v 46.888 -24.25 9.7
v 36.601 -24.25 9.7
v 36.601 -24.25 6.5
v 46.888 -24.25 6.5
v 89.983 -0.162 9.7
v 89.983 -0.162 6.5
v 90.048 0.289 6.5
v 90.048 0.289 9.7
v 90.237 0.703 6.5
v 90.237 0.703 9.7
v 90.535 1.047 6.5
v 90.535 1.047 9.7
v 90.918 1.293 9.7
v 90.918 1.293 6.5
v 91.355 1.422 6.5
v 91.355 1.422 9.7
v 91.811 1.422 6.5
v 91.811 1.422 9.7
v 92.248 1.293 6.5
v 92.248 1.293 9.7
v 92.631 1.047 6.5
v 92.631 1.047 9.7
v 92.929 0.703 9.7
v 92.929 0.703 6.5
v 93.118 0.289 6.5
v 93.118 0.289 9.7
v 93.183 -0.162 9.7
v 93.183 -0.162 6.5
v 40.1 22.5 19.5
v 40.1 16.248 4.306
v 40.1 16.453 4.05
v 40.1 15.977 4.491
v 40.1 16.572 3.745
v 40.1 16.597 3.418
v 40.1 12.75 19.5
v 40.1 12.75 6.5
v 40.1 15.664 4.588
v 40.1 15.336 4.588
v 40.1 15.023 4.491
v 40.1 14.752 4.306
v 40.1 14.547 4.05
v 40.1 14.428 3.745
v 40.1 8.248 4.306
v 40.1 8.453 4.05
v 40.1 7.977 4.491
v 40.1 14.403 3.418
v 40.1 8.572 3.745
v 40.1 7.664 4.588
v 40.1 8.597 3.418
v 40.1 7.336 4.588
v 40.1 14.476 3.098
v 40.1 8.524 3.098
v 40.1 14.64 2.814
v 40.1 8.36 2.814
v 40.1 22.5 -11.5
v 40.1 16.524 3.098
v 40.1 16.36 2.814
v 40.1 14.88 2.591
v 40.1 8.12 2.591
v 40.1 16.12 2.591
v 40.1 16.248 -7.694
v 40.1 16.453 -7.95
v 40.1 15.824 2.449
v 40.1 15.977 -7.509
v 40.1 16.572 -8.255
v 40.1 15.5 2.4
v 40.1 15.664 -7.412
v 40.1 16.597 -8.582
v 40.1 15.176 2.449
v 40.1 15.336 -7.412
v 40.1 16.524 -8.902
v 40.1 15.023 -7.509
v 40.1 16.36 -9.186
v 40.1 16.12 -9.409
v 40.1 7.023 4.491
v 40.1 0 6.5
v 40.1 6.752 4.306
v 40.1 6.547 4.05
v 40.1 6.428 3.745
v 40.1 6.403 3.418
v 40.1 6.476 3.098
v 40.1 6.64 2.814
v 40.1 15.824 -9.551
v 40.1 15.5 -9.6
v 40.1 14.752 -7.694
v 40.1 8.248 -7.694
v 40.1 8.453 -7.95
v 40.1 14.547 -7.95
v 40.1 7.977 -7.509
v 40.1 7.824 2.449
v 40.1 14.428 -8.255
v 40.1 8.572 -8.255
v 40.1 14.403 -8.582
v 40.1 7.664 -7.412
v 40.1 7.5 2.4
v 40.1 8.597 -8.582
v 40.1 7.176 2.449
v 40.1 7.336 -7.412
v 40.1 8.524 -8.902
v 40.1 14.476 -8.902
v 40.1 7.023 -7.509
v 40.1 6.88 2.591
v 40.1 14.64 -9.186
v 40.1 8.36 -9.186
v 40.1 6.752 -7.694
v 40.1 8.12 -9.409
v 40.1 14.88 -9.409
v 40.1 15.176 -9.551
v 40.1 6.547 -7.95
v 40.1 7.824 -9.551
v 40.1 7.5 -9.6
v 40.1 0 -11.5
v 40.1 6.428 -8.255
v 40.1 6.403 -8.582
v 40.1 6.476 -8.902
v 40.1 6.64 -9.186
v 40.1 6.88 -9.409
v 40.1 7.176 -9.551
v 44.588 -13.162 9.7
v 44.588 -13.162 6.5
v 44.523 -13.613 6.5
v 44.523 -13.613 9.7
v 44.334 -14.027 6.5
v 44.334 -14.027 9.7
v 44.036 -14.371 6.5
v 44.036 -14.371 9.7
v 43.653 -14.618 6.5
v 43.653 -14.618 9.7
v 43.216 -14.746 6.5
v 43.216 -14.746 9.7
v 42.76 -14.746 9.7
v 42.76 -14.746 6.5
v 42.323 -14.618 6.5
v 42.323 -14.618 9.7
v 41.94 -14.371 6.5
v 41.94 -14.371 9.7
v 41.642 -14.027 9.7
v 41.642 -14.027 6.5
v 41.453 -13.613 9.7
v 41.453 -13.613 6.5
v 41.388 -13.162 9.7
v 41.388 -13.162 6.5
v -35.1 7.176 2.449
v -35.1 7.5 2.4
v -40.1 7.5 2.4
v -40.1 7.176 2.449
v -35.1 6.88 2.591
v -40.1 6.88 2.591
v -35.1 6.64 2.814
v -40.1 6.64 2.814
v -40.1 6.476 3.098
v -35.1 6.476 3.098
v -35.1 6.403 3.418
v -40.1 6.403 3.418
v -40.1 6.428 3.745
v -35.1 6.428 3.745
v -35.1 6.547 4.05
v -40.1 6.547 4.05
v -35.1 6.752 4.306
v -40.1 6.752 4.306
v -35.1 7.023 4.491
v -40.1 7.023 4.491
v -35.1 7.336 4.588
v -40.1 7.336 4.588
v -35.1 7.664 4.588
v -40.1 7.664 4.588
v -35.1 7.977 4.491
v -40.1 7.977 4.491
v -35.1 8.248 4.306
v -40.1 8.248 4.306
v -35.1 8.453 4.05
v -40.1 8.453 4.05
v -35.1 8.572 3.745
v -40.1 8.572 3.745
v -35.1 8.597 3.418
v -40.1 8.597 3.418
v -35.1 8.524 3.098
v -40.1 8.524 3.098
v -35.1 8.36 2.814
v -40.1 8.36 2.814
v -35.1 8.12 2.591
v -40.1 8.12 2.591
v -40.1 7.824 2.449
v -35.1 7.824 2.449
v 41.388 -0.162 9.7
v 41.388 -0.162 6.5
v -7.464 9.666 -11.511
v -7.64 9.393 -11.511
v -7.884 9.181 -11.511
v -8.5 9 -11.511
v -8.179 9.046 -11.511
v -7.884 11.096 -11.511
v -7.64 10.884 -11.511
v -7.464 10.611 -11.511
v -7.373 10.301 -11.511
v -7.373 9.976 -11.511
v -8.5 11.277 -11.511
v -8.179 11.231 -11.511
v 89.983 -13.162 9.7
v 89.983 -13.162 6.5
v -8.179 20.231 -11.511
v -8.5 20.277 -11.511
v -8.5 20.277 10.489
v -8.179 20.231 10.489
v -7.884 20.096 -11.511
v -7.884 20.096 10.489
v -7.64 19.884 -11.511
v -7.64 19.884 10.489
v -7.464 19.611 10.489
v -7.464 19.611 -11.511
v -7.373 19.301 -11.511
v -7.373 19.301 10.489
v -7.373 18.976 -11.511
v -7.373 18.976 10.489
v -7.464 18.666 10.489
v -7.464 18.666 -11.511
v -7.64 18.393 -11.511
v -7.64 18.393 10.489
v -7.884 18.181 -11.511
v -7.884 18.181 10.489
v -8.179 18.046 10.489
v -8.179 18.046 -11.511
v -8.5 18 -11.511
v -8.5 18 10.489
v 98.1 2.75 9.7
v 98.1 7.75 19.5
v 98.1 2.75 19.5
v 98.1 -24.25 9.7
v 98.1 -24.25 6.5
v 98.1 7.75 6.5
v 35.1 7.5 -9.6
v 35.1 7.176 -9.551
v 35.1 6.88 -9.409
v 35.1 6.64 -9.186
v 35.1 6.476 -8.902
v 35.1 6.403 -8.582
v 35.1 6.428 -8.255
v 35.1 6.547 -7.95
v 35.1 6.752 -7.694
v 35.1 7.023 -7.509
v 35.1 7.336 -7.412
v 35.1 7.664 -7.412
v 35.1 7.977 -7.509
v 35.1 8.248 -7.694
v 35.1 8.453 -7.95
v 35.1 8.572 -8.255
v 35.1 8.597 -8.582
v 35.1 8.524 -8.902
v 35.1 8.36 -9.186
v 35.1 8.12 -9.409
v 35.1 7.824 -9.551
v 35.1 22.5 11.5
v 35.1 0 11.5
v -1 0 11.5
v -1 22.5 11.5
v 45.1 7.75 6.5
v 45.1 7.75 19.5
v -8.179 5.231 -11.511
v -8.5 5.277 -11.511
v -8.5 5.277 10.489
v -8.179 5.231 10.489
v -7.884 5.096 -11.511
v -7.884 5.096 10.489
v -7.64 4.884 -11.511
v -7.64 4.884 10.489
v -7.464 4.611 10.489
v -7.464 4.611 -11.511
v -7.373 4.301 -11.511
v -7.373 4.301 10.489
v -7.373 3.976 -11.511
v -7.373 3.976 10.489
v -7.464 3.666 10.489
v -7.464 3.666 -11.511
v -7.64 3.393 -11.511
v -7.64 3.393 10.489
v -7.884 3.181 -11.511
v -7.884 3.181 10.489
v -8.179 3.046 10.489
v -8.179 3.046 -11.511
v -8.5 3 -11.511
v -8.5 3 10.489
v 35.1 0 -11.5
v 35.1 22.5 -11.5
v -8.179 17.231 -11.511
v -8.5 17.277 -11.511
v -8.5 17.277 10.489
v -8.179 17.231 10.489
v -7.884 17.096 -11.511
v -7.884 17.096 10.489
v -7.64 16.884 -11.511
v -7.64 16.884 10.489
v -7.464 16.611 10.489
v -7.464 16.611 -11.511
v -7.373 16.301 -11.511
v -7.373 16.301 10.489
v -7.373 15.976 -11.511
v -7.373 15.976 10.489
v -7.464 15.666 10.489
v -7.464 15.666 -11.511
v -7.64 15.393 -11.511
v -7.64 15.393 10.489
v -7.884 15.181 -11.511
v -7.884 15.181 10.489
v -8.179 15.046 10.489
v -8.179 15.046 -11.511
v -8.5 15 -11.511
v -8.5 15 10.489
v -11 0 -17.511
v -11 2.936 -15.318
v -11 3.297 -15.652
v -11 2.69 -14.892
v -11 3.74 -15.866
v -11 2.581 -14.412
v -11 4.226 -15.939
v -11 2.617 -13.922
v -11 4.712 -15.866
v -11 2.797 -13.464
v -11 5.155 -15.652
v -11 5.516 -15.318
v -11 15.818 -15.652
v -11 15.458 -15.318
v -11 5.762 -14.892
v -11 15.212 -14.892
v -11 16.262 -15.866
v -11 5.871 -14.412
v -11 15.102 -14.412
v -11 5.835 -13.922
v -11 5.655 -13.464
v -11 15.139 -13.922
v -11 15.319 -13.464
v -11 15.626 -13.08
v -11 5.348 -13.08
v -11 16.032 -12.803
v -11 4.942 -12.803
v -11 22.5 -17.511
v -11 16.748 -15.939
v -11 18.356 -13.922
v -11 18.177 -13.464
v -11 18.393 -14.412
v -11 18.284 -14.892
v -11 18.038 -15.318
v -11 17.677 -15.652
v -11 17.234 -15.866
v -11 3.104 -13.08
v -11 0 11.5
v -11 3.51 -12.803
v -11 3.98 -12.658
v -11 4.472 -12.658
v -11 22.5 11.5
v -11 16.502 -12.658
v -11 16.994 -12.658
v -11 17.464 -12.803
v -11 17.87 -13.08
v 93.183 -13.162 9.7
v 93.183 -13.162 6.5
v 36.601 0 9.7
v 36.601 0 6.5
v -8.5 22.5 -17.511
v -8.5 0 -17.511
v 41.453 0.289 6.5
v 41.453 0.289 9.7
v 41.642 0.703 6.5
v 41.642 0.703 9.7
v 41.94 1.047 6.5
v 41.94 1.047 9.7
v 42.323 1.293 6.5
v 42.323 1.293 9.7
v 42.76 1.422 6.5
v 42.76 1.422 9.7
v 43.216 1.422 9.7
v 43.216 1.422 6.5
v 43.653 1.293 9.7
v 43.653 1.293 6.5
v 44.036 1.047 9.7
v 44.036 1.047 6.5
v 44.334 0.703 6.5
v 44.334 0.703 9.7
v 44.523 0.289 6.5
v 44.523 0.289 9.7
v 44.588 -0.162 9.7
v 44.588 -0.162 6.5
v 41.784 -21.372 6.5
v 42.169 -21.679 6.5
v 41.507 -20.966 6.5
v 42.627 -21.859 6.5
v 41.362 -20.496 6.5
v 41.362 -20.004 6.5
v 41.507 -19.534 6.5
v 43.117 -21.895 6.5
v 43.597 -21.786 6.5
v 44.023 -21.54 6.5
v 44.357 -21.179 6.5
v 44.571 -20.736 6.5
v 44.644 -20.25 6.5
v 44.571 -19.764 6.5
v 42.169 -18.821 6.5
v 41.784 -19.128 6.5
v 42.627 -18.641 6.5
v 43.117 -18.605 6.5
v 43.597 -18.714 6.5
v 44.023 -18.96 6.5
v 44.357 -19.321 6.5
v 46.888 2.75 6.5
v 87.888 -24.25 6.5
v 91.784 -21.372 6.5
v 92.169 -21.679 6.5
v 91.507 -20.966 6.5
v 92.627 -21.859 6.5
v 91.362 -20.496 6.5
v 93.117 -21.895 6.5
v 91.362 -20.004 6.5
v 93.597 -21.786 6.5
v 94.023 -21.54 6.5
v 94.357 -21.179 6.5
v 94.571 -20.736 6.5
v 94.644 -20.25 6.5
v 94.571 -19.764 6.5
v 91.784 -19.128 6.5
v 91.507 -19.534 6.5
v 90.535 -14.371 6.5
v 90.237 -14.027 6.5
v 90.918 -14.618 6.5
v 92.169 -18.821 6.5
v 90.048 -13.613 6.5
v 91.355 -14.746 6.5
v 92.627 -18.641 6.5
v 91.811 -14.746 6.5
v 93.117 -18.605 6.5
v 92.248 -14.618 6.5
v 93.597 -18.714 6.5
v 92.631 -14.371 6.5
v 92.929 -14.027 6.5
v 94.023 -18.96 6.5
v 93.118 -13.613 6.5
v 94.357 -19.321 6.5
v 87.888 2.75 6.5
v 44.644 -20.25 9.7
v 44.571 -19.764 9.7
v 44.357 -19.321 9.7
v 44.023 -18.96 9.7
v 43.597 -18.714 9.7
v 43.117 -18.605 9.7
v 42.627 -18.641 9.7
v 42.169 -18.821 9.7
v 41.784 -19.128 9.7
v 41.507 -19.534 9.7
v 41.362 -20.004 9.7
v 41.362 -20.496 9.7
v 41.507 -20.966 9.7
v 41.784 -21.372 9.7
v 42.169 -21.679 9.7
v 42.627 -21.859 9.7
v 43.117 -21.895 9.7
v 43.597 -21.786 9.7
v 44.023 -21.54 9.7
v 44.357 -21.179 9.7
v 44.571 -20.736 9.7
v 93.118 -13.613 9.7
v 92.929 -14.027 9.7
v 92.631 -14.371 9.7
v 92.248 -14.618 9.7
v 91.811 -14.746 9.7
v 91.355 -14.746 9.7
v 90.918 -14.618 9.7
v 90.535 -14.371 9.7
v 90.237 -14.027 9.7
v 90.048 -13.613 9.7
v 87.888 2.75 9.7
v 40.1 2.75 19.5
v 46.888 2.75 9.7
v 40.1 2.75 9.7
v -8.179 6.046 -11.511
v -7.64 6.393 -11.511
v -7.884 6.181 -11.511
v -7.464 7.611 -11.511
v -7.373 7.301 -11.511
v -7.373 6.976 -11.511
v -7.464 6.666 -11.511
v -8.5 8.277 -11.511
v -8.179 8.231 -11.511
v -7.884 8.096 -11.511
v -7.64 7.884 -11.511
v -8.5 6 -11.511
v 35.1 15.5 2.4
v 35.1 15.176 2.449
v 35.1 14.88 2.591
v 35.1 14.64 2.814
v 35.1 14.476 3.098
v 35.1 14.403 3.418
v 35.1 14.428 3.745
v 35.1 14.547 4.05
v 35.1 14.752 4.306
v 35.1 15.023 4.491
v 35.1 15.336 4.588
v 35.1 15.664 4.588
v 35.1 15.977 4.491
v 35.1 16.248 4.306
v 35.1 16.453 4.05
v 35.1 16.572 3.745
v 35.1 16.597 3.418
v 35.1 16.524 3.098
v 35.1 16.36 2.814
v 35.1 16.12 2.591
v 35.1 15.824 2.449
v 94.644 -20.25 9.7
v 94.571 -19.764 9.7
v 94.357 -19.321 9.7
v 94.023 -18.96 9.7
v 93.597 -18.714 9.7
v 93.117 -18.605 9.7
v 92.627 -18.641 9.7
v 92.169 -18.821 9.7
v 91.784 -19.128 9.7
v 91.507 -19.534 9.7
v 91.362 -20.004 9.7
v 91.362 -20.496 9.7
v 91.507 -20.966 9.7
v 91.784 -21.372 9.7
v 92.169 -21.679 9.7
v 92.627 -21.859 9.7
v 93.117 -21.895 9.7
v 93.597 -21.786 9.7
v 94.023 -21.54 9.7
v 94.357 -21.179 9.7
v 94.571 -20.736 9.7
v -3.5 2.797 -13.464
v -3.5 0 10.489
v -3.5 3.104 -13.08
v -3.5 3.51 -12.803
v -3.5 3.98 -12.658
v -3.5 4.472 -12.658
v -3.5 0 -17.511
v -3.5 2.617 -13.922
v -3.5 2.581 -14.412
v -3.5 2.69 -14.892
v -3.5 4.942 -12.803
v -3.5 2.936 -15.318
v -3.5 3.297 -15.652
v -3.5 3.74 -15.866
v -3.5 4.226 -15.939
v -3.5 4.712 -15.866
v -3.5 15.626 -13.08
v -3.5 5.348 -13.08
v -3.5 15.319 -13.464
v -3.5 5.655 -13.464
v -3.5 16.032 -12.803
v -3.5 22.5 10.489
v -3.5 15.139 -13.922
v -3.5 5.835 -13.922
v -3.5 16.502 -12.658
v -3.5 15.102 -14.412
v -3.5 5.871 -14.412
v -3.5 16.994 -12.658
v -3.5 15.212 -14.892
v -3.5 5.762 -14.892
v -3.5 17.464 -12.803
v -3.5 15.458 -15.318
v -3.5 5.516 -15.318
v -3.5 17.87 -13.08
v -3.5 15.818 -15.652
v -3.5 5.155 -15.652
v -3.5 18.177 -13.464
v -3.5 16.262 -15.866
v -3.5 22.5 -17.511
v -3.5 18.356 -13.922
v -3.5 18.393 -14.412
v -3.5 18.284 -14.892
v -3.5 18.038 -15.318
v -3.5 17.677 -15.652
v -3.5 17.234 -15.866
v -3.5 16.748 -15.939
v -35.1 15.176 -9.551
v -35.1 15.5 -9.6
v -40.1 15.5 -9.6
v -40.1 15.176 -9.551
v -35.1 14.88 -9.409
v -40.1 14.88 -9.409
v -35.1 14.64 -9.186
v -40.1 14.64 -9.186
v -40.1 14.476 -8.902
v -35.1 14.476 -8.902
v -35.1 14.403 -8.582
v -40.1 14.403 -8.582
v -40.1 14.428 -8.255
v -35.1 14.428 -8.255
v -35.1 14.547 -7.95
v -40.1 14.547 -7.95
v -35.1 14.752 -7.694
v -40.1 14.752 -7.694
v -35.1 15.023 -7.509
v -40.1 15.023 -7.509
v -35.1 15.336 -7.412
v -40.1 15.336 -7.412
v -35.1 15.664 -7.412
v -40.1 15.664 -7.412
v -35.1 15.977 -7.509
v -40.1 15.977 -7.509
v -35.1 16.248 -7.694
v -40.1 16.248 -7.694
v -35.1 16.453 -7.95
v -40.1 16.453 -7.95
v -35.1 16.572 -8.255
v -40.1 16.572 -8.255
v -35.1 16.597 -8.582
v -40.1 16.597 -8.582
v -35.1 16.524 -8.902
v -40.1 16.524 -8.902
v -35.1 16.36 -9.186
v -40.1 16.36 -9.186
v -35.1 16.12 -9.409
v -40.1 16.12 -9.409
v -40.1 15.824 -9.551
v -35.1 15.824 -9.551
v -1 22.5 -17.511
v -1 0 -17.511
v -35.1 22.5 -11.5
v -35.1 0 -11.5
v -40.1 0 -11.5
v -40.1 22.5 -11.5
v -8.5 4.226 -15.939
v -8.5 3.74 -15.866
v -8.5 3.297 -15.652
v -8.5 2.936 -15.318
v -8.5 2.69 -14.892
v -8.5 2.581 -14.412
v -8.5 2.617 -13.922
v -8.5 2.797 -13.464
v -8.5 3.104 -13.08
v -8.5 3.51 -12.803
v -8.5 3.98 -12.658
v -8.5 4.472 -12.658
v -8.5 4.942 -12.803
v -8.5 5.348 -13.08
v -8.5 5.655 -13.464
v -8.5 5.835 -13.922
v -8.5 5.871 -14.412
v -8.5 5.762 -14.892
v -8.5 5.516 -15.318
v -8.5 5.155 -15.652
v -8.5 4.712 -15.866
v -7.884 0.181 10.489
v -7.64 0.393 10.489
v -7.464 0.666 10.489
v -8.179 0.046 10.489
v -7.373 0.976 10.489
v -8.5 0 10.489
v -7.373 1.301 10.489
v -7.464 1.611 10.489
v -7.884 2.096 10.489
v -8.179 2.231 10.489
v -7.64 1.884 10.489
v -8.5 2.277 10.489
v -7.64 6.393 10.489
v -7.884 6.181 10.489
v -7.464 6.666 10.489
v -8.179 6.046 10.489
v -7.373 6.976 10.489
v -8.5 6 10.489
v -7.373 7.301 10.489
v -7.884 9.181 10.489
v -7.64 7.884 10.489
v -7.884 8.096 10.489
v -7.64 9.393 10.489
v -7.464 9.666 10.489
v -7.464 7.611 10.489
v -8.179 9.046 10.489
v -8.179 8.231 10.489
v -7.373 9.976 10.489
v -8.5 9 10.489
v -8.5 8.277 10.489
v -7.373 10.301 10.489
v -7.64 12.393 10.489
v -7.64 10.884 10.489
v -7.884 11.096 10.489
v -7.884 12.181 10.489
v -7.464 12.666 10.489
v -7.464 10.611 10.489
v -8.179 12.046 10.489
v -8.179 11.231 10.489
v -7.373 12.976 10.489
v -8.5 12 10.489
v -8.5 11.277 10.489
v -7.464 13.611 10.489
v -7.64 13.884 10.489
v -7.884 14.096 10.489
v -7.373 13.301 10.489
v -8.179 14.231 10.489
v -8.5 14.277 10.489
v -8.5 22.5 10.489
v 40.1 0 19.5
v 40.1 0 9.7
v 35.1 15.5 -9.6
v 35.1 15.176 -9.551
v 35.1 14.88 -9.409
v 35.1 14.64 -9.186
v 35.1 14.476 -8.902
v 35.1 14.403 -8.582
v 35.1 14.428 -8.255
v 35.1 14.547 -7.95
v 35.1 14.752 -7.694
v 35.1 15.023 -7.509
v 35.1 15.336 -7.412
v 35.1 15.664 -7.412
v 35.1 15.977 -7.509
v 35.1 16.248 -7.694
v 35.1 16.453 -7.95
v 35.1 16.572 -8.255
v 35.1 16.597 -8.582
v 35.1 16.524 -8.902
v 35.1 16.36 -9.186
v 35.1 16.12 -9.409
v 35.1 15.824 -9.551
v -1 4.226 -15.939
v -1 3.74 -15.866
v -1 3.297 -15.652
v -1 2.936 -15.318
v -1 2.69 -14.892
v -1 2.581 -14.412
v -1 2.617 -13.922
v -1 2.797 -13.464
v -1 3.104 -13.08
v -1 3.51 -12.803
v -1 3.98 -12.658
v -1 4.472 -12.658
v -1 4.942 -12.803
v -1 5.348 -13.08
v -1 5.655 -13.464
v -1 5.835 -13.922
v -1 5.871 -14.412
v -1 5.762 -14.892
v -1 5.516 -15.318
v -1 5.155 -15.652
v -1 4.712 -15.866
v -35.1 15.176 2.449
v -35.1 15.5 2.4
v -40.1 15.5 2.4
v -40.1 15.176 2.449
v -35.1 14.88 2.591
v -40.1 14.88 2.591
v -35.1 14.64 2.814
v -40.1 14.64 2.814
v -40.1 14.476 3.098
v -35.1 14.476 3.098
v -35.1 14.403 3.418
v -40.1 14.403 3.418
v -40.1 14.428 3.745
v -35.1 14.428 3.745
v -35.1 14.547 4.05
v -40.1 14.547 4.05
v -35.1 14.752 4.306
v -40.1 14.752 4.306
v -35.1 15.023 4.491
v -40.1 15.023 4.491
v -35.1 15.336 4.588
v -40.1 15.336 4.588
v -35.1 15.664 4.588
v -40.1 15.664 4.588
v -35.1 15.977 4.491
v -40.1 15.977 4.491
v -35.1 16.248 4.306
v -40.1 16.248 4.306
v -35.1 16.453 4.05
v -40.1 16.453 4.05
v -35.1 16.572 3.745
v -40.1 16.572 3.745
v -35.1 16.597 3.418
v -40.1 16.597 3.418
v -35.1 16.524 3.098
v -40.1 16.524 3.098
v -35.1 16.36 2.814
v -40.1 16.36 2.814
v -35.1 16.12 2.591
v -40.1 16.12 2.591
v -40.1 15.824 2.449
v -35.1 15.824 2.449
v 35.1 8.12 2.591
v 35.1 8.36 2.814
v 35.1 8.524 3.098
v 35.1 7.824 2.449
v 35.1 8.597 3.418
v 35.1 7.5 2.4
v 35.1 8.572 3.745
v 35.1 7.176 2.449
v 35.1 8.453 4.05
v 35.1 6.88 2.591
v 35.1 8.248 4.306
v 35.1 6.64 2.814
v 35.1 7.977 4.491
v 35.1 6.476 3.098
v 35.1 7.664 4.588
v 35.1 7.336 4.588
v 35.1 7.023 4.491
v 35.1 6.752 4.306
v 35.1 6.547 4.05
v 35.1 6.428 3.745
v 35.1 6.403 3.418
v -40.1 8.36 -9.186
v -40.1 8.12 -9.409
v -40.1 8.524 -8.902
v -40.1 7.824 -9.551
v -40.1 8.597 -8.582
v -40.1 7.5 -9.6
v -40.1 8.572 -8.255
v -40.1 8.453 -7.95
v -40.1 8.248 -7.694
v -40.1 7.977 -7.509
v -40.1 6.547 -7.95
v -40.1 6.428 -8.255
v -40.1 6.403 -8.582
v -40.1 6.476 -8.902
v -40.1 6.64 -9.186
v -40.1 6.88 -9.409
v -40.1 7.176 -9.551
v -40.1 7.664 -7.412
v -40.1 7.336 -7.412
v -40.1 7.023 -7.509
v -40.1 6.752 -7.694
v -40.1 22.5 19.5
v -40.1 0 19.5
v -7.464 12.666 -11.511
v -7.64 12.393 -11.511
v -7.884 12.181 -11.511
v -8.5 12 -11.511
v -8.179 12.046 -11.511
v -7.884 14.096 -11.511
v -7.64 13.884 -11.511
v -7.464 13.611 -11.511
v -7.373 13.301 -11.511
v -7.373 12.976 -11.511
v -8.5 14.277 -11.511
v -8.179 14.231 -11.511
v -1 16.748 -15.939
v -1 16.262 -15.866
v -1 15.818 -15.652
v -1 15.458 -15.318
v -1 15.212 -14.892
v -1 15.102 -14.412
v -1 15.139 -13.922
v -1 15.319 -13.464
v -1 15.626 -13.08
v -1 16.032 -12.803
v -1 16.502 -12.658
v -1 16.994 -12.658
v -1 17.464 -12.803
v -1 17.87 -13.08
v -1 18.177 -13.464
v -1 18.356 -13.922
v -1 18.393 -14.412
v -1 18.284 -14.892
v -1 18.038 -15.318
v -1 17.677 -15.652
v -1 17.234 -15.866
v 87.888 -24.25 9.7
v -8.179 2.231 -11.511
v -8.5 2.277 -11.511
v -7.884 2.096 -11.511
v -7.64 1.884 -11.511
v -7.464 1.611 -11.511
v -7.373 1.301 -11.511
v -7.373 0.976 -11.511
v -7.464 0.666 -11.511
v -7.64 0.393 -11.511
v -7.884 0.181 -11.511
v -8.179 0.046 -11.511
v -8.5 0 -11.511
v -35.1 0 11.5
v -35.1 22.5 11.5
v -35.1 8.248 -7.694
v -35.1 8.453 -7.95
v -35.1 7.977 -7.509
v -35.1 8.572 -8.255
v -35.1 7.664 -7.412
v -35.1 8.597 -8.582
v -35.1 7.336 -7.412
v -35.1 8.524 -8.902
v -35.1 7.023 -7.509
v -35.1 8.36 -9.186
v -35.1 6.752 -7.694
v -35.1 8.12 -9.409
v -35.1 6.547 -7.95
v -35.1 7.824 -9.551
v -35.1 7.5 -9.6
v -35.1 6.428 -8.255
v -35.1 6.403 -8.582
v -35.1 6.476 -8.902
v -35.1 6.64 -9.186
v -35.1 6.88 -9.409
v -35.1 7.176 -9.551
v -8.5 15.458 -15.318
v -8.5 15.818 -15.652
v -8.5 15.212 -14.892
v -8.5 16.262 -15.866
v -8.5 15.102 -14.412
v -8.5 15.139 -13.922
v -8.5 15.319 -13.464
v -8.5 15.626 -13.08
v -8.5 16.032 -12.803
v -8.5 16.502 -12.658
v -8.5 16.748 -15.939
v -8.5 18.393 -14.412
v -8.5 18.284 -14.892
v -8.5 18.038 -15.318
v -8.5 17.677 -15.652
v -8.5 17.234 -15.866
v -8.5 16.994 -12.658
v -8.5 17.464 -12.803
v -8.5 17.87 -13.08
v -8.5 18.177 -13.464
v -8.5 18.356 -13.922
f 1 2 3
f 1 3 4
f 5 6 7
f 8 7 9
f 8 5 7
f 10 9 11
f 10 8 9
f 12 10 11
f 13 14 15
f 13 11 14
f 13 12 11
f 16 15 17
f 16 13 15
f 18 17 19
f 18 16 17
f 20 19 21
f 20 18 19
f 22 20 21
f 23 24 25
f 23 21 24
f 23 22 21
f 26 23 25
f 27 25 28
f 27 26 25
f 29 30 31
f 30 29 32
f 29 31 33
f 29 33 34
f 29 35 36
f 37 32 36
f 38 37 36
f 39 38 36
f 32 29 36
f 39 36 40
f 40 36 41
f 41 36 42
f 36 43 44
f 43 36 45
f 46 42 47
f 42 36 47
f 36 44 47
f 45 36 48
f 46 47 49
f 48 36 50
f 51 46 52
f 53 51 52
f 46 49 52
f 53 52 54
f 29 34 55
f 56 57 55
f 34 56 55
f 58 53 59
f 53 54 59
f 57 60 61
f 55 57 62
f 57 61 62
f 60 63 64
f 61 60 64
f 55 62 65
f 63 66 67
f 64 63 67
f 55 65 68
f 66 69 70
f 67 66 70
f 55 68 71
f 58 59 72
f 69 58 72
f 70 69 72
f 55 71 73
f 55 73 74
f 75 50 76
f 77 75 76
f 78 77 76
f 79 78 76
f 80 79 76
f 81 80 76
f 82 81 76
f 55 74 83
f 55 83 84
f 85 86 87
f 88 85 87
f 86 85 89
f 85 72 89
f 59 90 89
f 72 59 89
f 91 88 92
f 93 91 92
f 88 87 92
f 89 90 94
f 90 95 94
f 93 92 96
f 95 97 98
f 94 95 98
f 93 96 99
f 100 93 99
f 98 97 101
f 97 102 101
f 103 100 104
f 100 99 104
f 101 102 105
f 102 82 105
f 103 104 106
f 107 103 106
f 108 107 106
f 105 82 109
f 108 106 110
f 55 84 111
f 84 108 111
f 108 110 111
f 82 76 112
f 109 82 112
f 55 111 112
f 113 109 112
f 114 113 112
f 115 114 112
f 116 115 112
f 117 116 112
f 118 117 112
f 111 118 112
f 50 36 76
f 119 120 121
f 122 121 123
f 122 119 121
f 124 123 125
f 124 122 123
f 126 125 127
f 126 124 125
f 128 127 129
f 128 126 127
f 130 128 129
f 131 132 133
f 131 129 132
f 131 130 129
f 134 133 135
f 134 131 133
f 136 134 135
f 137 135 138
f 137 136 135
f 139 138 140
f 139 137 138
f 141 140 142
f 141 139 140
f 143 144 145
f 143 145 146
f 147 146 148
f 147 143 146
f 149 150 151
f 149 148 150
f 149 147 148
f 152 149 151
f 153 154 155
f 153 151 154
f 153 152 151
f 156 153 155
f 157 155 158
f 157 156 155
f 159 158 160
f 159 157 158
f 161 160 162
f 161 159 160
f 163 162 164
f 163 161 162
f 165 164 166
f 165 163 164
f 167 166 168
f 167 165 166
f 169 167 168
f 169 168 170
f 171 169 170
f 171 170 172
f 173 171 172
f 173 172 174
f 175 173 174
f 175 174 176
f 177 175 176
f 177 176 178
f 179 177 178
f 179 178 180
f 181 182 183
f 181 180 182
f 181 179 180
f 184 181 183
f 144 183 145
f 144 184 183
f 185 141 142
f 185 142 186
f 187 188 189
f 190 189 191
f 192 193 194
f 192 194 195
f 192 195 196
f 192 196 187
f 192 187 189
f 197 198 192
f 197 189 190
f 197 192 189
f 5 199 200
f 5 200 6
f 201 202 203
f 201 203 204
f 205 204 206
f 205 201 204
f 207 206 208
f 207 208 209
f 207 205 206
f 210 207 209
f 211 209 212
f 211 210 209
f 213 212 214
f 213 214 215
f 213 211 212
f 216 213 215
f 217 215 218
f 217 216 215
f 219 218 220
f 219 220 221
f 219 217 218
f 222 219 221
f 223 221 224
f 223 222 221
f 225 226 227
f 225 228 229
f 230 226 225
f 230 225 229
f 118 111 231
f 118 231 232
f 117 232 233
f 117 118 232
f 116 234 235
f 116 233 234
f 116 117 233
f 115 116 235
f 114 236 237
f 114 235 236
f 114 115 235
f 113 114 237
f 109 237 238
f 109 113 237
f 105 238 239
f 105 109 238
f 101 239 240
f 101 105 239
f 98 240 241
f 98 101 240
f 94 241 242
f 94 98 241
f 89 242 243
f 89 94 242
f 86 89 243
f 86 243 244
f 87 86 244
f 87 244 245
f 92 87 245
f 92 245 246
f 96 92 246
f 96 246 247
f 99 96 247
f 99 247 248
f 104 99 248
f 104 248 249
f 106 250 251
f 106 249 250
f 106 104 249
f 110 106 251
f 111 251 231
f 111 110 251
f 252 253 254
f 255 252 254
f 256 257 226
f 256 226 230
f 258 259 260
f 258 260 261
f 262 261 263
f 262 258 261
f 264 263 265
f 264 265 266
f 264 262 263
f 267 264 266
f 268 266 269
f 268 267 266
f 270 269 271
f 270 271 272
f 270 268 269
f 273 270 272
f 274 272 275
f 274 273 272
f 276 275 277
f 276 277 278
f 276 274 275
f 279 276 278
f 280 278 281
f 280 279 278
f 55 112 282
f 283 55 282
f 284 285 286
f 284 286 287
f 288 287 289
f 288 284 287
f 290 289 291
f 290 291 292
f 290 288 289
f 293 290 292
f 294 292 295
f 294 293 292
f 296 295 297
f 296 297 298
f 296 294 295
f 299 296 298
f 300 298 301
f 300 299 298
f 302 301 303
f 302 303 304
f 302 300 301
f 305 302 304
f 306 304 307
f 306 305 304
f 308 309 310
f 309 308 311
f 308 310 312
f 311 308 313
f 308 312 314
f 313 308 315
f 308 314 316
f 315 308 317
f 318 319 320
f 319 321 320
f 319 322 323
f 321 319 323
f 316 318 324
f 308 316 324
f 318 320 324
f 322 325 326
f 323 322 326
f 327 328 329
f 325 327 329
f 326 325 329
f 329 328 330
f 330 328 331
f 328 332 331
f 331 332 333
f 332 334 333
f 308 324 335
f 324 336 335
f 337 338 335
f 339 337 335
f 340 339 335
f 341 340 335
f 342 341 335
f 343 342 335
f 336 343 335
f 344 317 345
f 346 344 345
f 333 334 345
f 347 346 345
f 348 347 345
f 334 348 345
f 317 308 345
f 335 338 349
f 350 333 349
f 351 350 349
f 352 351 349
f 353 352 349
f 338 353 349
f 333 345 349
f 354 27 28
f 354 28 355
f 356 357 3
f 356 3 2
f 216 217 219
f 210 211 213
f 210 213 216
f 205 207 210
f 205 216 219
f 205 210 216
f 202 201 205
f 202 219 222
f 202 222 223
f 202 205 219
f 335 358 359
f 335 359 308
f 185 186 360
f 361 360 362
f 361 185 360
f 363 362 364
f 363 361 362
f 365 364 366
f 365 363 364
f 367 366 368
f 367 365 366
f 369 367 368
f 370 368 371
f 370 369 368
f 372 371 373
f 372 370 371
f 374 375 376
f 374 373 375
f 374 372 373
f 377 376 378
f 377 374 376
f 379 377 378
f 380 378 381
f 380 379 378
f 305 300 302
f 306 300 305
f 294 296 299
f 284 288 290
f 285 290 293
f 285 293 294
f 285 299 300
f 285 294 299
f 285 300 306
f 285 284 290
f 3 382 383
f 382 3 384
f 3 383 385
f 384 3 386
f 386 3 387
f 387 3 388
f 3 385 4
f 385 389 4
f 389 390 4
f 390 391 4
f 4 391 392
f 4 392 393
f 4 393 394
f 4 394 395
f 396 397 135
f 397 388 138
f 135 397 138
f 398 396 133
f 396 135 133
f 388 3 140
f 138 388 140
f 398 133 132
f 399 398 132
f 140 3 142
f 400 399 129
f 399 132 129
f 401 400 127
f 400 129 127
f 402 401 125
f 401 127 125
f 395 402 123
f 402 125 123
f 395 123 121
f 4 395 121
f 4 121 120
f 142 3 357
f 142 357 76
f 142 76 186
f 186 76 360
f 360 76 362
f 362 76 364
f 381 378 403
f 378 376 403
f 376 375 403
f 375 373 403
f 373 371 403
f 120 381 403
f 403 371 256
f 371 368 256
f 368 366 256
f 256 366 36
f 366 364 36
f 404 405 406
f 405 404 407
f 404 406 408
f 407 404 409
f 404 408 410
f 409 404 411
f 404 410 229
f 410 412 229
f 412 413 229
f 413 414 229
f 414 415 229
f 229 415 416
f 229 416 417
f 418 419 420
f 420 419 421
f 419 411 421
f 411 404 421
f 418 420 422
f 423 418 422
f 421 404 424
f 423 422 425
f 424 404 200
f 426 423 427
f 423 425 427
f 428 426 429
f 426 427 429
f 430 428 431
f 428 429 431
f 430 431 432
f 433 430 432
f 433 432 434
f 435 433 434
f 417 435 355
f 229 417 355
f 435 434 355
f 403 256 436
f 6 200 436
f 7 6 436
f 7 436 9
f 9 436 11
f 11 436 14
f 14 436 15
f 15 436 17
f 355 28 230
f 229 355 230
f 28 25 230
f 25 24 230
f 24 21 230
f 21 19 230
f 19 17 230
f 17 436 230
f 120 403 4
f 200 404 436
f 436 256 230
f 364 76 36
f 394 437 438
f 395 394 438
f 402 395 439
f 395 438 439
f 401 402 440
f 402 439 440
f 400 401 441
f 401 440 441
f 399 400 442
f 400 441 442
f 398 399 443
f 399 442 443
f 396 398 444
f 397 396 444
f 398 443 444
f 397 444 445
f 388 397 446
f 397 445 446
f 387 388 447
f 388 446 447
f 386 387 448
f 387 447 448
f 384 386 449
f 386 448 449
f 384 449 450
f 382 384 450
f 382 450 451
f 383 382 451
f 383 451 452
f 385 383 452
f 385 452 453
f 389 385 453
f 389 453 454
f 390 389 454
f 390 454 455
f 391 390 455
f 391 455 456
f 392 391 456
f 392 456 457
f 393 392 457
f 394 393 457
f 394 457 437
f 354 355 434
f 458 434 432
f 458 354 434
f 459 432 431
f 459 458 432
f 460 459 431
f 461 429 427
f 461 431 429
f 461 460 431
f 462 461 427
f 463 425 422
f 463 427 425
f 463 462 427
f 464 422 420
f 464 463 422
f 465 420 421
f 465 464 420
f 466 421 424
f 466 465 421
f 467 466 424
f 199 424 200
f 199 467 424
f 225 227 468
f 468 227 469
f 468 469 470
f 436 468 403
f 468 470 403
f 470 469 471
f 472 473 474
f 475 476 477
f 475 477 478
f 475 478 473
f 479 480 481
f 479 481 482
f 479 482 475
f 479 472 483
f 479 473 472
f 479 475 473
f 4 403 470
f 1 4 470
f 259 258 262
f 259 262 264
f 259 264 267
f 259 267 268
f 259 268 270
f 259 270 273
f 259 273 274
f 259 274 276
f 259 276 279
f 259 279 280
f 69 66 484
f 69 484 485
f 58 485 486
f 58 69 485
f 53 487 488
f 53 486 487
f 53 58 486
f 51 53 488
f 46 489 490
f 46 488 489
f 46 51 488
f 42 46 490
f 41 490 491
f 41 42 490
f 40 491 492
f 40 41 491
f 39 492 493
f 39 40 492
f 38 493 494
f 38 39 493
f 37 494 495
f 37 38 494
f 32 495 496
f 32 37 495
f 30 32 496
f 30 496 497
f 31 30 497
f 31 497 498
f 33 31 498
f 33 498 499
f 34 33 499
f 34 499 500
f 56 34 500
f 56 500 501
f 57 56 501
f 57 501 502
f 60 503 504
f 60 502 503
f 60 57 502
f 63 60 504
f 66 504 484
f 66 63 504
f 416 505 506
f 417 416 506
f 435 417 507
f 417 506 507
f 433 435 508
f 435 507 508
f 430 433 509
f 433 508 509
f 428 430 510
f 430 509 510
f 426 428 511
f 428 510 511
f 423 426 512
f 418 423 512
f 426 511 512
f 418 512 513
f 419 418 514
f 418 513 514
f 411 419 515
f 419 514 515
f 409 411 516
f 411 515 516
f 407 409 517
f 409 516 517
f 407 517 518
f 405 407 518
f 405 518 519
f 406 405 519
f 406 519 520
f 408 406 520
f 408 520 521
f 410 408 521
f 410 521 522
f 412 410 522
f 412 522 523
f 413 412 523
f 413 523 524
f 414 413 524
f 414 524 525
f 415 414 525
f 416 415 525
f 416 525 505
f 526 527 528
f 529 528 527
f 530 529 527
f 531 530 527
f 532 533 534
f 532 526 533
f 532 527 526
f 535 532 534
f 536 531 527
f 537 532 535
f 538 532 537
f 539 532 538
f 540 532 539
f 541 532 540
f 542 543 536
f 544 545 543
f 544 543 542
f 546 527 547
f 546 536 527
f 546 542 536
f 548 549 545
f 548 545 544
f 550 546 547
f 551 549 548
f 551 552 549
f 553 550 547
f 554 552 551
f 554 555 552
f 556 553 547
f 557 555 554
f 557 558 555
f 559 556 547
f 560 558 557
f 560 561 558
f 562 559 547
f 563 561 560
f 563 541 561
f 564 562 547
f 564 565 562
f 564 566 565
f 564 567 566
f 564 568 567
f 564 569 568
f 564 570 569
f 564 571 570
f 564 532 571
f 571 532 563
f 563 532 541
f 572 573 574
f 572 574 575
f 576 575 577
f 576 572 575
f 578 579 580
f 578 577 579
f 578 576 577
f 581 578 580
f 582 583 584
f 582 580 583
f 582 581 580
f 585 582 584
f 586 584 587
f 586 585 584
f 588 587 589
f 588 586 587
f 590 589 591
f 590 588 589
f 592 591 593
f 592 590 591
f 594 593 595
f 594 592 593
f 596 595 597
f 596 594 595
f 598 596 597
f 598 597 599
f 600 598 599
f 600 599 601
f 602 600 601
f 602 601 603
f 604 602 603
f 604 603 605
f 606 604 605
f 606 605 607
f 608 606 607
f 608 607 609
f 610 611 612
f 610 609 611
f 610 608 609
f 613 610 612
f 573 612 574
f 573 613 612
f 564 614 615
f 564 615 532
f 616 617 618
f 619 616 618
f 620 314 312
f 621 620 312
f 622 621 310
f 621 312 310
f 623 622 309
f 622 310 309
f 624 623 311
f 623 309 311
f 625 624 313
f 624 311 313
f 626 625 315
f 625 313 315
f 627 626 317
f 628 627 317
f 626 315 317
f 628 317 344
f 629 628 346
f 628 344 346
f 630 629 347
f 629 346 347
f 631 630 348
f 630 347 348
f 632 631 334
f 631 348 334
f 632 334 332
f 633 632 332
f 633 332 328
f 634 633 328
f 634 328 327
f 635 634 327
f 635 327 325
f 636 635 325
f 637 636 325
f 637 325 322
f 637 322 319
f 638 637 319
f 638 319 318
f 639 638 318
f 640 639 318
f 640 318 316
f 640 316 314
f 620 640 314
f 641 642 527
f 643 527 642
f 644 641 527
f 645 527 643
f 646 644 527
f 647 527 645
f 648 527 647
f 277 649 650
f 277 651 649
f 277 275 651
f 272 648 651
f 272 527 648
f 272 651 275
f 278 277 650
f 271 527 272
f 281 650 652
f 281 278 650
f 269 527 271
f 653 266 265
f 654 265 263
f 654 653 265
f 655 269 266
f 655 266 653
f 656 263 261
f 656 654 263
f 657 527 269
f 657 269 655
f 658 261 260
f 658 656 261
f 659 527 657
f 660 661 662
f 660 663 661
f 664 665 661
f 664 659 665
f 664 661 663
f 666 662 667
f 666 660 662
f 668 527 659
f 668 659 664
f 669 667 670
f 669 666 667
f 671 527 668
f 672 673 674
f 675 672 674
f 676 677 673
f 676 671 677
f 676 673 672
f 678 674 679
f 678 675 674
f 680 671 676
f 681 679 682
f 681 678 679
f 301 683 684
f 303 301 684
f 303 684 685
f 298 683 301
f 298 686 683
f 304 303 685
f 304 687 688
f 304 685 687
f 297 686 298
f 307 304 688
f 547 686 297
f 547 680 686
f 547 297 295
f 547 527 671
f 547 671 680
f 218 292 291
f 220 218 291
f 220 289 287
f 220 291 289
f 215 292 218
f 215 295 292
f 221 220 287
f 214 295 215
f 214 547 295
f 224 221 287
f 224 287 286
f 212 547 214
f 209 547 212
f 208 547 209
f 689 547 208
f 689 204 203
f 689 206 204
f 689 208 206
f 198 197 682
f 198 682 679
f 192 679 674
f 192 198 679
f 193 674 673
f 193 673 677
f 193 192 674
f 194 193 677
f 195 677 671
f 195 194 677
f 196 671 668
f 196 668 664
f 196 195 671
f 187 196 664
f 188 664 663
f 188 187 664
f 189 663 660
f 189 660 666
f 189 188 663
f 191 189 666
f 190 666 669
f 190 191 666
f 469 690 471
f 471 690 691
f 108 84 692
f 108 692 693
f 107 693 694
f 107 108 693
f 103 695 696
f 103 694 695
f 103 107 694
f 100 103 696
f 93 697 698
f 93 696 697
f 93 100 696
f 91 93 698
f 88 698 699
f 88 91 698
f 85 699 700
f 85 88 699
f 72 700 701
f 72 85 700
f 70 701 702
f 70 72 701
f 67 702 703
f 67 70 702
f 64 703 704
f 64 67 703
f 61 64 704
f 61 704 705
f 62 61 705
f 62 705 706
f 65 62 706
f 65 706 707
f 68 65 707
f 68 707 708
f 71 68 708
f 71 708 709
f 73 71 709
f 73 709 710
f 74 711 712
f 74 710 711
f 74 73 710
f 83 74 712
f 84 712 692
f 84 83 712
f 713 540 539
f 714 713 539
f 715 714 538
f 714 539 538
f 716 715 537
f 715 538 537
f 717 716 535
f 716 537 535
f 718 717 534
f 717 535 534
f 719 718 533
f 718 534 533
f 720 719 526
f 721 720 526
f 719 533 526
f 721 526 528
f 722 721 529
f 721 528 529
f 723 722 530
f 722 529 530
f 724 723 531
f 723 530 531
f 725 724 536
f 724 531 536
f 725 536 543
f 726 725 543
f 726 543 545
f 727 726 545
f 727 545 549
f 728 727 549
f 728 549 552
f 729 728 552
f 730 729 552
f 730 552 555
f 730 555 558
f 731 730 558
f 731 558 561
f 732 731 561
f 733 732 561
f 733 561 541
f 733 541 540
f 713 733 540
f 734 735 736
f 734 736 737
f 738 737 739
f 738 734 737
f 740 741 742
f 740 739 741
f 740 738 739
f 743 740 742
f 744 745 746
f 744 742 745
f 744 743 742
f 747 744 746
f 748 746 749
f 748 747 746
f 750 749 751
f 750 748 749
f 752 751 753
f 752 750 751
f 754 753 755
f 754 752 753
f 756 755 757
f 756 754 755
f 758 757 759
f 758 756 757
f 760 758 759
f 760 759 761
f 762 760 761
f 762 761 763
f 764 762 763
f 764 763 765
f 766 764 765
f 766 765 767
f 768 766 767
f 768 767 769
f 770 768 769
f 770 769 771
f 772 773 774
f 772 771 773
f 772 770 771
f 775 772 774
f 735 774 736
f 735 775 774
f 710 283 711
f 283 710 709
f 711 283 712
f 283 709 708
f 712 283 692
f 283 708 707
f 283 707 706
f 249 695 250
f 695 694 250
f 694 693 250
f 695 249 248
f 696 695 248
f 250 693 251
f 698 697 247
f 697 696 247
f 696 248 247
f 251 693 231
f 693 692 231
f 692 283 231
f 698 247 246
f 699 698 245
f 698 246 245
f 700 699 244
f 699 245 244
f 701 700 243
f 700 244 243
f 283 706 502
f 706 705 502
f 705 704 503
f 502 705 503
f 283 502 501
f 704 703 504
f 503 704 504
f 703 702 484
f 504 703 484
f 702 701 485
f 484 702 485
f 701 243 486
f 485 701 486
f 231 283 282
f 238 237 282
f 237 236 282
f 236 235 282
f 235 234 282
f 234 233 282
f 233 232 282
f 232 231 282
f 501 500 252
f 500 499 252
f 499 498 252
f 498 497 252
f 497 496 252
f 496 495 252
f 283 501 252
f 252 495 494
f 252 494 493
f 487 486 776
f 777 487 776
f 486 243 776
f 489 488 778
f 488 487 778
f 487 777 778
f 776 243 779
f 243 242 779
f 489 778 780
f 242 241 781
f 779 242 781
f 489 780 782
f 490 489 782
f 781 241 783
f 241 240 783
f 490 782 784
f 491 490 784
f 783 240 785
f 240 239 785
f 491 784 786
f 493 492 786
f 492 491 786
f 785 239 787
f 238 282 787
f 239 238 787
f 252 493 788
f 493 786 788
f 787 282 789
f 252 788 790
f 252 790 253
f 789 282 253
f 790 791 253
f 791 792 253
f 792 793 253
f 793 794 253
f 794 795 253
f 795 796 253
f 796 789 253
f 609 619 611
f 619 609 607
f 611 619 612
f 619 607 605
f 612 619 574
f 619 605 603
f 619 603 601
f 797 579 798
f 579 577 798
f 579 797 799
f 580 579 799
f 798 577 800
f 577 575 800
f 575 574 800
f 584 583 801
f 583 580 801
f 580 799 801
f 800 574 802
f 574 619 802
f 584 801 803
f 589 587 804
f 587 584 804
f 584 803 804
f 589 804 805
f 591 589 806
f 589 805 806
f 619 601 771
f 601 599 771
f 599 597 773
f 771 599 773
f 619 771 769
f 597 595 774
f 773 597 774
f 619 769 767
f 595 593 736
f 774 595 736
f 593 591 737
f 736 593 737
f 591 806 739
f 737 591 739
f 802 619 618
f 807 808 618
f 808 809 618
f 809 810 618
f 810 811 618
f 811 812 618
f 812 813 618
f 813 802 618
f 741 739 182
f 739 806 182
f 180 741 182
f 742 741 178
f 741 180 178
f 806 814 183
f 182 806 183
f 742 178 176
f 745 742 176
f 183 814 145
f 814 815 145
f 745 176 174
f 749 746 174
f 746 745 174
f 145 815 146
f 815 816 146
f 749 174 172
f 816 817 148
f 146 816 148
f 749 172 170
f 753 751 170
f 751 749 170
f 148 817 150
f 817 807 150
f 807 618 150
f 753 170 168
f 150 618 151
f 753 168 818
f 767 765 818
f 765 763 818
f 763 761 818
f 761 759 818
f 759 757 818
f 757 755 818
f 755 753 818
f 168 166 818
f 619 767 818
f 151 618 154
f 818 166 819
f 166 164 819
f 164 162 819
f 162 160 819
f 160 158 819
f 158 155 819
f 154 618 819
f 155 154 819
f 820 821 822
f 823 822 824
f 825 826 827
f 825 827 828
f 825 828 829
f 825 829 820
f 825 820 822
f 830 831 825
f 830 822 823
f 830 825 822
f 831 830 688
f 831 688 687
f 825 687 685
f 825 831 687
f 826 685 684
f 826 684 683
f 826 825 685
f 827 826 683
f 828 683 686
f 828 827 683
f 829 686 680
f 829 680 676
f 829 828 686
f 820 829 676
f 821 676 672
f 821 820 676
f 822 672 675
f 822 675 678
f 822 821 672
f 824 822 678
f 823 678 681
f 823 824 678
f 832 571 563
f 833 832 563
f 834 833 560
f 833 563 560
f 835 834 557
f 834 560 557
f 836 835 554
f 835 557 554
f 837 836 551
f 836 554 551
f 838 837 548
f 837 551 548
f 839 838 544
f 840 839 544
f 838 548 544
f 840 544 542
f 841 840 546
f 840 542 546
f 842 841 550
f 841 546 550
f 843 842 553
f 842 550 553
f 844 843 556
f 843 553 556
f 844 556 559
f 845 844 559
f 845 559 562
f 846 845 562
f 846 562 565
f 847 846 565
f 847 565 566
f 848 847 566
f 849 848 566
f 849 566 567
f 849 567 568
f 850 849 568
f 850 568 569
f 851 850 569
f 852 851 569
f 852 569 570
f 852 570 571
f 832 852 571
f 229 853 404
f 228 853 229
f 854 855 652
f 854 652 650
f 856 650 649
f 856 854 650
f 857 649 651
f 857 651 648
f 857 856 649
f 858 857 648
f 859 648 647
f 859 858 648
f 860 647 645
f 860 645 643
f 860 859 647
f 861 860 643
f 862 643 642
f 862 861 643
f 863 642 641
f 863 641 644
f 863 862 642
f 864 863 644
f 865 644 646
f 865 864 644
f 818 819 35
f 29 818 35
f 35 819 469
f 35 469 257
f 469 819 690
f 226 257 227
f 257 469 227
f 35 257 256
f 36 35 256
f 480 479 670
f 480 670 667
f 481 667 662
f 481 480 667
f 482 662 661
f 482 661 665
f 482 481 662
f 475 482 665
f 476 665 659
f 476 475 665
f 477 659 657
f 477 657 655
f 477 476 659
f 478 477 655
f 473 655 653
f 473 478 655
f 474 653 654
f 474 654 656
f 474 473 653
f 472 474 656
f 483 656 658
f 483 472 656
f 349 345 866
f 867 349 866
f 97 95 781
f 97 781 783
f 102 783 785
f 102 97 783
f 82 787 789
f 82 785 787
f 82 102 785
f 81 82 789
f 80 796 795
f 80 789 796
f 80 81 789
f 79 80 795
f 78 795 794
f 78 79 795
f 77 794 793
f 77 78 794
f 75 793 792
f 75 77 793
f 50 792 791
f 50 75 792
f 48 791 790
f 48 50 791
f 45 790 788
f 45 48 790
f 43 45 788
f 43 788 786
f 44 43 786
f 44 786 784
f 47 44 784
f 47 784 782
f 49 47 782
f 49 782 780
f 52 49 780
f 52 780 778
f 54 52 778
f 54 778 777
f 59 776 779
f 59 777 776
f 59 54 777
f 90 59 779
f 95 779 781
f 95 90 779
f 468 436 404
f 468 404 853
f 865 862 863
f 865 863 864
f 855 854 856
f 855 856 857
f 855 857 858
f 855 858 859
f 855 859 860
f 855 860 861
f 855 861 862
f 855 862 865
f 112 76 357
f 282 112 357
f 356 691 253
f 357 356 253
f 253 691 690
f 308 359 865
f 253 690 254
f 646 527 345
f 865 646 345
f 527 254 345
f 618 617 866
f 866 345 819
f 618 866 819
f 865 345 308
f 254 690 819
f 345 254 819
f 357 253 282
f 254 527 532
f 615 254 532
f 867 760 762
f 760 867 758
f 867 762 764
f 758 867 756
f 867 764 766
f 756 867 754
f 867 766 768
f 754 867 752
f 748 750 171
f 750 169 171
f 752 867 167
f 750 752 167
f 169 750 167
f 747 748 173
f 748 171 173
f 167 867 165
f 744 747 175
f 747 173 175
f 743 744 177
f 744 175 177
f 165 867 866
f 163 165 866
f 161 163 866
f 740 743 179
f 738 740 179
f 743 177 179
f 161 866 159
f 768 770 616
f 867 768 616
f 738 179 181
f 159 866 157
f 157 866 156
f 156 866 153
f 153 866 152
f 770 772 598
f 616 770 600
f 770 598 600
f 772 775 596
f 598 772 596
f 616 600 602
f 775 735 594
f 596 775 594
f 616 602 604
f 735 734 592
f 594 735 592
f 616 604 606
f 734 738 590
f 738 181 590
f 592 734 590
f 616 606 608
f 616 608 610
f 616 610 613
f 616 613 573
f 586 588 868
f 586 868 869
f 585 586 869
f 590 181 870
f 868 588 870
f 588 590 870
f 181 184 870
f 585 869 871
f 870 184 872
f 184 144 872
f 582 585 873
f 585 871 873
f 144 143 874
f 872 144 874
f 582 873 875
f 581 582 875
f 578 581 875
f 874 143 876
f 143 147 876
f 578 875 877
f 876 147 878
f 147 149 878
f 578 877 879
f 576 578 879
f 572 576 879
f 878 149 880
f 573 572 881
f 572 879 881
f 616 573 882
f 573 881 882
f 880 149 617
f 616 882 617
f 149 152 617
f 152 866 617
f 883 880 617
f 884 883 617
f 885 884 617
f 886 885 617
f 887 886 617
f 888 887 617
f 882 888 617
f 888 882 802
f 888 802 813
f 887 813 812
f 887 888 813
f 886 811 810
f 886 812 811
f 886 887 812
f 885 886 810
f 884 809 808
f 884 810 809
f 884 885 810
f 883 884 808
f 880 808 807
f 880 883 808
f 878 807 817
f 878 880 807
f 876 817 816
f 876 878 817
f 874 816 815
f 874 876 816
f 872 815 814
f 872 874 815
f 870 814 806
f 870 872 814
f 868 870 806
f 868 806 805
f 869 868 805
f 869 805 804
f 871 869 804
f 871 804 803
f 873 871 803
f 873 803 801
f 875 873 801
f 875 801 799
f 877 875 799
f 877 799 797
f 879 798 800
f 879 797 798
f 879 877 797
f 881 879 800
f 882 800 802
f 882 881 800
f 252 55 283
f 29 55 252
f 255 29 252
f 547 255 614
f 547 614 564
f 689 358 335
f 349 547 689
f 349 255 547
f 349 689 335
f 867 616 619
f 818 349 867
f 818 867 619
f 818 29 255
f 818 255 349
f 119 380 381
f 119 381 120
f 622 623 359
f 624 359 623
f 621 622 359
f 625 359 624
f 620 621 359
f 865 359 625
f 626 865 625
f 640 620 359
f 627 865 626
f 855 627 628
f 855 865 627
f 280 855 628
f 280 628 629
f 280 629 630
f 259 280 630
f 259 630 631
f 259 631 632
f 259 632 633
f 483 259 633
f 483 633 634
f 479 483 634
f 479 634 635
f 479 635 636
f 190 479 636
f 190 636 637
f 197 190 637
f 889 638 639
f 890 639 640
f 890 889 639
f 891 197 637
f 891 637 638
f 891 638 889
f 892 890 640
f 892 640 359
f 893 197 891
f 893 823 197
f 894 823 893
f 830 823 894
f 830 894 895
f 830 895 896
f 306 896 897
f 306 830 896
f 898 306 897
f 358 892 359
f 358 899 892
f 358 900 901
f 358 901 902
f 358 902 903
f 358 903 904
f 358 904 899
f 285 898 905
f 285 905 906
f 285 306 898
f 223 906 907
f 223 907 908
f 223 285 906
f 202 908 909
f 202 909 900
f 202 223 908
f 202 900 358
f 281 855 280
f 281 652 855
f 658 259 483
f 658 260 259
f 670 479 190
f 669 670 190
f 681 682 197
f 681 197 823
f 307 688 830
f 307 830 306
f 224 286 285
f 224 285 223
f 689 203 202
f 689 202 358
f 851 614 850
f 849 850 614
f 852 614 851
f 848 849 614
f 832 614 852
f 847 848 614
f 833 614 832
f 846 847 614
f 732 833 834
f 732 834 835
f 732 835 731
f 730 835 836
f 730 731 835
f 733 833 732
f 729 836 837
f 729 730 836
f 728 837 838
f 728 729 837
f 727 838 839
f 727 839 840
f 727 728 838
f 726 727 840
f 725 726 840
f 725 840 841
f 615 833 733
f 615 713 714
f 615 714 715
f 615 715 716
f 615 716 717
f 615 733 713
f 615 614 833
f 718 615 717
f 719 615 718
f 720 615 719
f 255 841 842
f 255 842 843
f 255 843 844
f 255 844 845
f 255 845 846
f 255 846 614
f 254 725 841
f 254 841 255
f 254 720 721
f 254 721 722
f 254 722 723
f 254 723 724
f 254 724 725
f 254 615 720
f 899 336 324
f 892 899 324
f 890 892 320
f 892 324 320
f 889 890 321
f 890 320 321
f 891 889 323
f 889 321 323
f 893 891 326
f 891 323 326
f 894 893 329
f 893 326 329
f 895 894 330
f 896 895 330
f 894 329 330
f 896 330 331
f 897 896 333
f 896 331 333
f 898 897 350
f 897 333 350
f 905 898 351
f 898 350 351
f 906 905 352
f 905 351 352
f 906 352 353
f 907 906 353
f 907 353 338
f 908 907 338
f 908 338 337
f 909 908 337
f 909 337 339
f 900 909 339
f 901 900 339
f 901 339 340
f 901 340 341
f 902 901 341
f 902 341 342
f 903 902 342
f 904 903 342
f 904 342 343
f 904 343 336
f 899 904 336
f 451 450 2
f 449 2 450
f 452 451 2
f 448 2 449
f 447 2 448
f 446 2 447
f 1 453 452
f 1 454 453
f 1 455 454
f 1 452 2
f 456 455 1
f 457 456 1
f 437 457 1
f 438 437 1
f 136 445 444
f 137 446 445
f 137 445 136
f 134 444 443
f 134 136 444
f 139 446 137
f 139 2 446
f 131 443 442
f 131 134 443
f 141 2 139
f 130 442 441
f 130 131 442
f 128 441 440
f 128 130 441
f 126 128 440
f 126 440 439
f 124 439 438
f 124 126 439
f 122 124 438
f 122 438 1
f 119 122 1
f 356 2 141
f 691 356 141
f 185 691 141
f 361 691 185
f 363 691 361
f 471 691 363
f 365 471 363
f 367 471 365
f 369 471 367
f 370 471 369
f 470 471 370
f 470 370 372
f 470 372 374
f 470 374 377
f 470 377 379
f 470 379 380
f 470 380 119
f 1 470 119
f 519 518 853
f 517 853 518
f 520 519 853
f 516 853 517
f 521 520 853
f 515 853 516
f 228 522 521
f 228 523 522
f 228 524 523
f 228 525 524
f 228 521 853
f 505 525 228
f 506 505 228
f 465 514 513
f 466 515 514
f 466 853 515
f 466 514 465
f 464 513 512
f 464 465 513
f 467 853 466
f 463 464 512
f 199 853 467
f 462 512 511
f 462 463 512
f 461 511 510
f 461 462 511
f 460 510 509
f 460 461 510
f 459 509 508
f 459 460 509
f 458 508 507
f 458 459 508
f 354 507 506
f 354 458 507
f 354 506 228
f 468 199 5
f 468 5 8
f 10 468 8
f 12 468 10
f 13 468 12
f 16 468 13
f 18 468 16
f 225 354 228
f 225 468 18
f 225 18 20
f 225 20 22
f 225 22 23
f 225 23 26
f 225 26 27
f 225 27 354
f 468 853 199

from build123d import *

# Parameters (mm, degrees)
EXTRUDE_1_DEPTH          = 22.5
CUT_EXTRUDE_1_DEPTH      = 55
CUT_EXTRUDE_1_DEPTH_BACK = 117
SKETCH_2_R               = 1.1
SKETCH_5_W               = 13
SKETCH_5_H               = 5
EXTRUDE_4_DEPTH          = 58
CHAMFER_1_SIZE           = 5
SKETCH_6_W               = 10.28735427
SKETCH_6_H               = 3.2
SKETCH_6_W_2             = 10.2120241
EXTRUDE_5_DEPTH          = 27
CUT_EXTRUDE_2_DEPTH      = 27
SKETCH_8_R               = 1.65
CUT_EXTRUDE_3_DEPTH      = 27
SKETCH_11_W              = 10
SKETCH_11_H              = 23.011480114
EXTRUDE_6_DEPTH          = 22.5
SKETCH_12_W              = 5
SKETCH_12_H              = 22.5
CUT_EXTRUDE_5_DEPTH      = 22
EXTRUDE_8_DEPTH          = 22
SKETCH_16_W              = 2.5
SKETCH_16_H              = 22.5
EXTRUDE_9_DEPTH          = 6
SKETCH_17_R              = 1.65
CUT_EXTRUDE_7_DEPTH      = 14


with BuildPart() as part:
    # 草图1 → 凸台-拉伸1 (new body)
    with BuildSketch(Plane(origin=(0, 0, 0), x_dir=(1, 0, 0), z_dir=(0, 1, 0))):
        Polygon((40.1, -19.5), (40.1, 11.5), (35.1, 11.5), (35.1, -11.5), (-35.1, -11.5), (-35.1, 11.5), (-40.1, 11.5), (-40.1, -19.5), align=None)
    extrude(amount=EXTRUDE_1_DEPTH)

    # 草图2 → 切除-拉伸1 (cut, two sides: drawn at the far end of the back side and taken through both)
    with BuildSketch(Plane.ZY.offset(40.1).offset(-CUT_EXTRUDE_1_DEPTH_BACK)):
        with Locations(Location((-8.5, 15.5, 0), (0, 0, 180))):
            Circle(SKETCH_2_R)
        with Locations(Location((3.5, 15.5, 0), (0, 0, 180))):
            Circle(SKETCH_2_R)
        with Locations(Location((3.5, 7.5, 0), (0, 0, 180))):
            Circle(SKETCH_2_R)
        with Locations(Location((-8.5, 7.5, 0), (0, 0, 180))):
            Circle(SKETCH_2_R)
    extrude(amount=CUT_EXTRUDE_1_DEPTH + CUT_EXTRUDE_1_DEPTH_BACK, mode=Mode.SUBTRACT)

    # 草图5 → 凸台-拉伸4 (add)
    with BuildSketch(Plane(origin=(40.1, 0, 0), x_dir=(0, 0, -1), z_dir=(1, 0, 0))):
        with Locations((-13, 5.25)):
            Rectangle(SKETCH_5_W, SKETCH_5_H)
    extrude(amount=EXTRUDE_4_DEPTH)

    # 倒角1
    chamfer_1_edges = [part.edges().sort_by_distance(p)[0] for p in [
        (40.1, 7.75, 13),
    ]]
    chamfer(chamfer_1_edges, length=CHAMFER_1_SIZE)

    # 草图6 → 凸台-拉伸5 (add)
    with BuildSketch(Plane.XZ.offset(-2.75)):
        with Locations((41.744298765, 8.1)):
            Rectangle(SKETCH_6_W, SKETCH_6_H)
        with Locations((92.99398795, 8.1)):
            Rectangle(SKETCH_6_W_2, SKETCH_6_H)
    extrude(amount=EXTRUDE_5_DEPTH)

    # 草图7 → 切除-拉伸2 (cut)
    with BuildSketch(Plane.XY.offset(9.7)):
        with BuildLine():
            Line((89.983046701, -13.162177047), (89.983046701, -0.162177047))
            ThreePointArc((89.983046701, -0.162177047), (91.583046701, 1.437822953), (93.183046701, -0.162177047))
            Line((93.183046701, -0.162177047), (93.183046701, -13.162177047))
            ThreePointArc((93.183046701, -13.162177047), (91.583046701, -14.762177047), (89.983046701, -13.162177047))
        make_face()
        with BuildLine():
            Line((41.3879759, -13.162177047), (41.3879759, -0.162177047))
            ThreePointArc((41.3879759, -0.162177047), (42.9879759, 1.437822953), (44.5879759, -0.162177047))
            Line((44.5879759, -0.162177047), (44.5879759, -13.162177047))
            ThreePointArc((44.5879759, -13.162177047), (42.9879759, -14.762177047), (41.3879759, -13.162177047))
        make_face()
    extrude(amount=-CUT_EXTRUDE_2_DEPTH, mode=Mode.SUBTRACT)

    # 草图8 → 切除-拉伸3 (cut)
    with BuildSketch(Plane.XY.offset(9.7)):
        with Locations((92.99398795, -20.25)):
            Circle(SKETCH_8_R)
        with Locations((42.99398795, -20.25)):
            Circle(SKETCH_8_R)
    extrude(amount=-CUT_EXTRUDE_3_DEPTH, mode=Mode.SUBTRACT)

    # 草图11 → 凸台-拉伸6 (add)
    with BuildSketch(Plane.XZ):
        with Locations((-6, -0.005740057)):
            Rectangle(SKETCH_11_W, SKETCH_11_H)
    extrude(amount=-EXTRUDE_6_DEPTH)

    # 草图12 → 切除-拉伸5 (cut)
    with BuildSketch(Plane(origin=(0, 0, -11.511480114), x_dir=(-1, 0, 0), z_dir=(0, 0, -1))):
        with Locations((6, 11.25)):
            Rectangle(SKETCH_12_W, SKETCH_12_H)
    extrude(amount=-CUT_EXTRUDE_5_DEPTH, mode=Mode.SUBTRACT)

    # 草图14 → 凸台-拉伸8 (add)
    with BuildSketch(Plane(origin=(0, 0, -11.511480114), x_dir=(-1, 0, 0), z_dir=(0, 0, -1))):
        with BuildLine():
            ThreePointArc((8.5, 2.276960614), (7.361519693, 1.138480307), (8.5, 0))
            Line((8.5, 0), (8.5, 2.276960614))
        make_face()
        with BuildLine():
            ThreePointArc((8.5, 5.276960614), (7.361519693, 4.138480307), (8.5, 3))
            Line((8.5, 3), (8.5, 5.276960614))
        make_face()
        with BuildLine():
            ThreePointArc((8.5, 8.276960614), (7.361519693, 7.138480307), (8.5, 6))
            Line((8.5, 6), (8.5, 8.276960614))
        make_face()
        with BuildLine():
            ThreePointArc((8.5, 11.276960614), (7.361519693, 10.138480307), (8.5, 9))
            Line((8.5, 9), (8.5, 11.276960614))
        make_face()
        with BuildLine():
            ThreePointArc((8.5, 17.276960614), (7.361519693, 16.138480307), (8.5, 15))
            Line((8.5, 15), (8.5, 17.276960614))
        make_face()
        with BuildLine():
            ThreePointArc((8.5, 20.276960614), (7.361519693, 19.138480307), (8.5, 18))
            Line((8.5, 18), (8.5, 20.276960614))
        make_face()
        with BuildLine():
            ThreePointArc((8.5, 14.276960614), (7.361519693, 13.138480307), (8.5, 12))
            Line((8.5, 12), (8.5, 14.276960614))
        make_face()
    extrude(amount=-EXTRUDE_8_DEPTH)

    # 草图16 → 凸台-拉伸9 (add)
    with BuildSketch(Plane(origin=(0, 0, -11.511480114), x_dir=(-1, 0, 0), z_dir=(0, 0, -1))):
        with Locations((9.75, 11.25)):
            Rectangle(SKETCH_16_W, SKETCH_16_H)
        with Locations((2.25, 11.25)):
            Rectangle(SKETCH_16_W, SKETCH_16_H)
    extrude(amount=EXTRUDE_9_DEPTH)

    # 草图17 → 切除-拉伸7 (cut)
    with BuildSketch(Plane.ZY.offset(11)):
        with Locations(Location((-14.289107962, 4.226014106, 0), (0, 0, 180))):
            Circle(SKETCH_17_R)
        with Locations(Location((-14.289107962, 16.747856376, 0), (0, 0, 180))):
            Circle(SKETCH_17_R)
    extrude(amount=-CUT_EXTRUDE_7_DEPTH, mode=Mode.SUBTRACT)


solid = part.part
